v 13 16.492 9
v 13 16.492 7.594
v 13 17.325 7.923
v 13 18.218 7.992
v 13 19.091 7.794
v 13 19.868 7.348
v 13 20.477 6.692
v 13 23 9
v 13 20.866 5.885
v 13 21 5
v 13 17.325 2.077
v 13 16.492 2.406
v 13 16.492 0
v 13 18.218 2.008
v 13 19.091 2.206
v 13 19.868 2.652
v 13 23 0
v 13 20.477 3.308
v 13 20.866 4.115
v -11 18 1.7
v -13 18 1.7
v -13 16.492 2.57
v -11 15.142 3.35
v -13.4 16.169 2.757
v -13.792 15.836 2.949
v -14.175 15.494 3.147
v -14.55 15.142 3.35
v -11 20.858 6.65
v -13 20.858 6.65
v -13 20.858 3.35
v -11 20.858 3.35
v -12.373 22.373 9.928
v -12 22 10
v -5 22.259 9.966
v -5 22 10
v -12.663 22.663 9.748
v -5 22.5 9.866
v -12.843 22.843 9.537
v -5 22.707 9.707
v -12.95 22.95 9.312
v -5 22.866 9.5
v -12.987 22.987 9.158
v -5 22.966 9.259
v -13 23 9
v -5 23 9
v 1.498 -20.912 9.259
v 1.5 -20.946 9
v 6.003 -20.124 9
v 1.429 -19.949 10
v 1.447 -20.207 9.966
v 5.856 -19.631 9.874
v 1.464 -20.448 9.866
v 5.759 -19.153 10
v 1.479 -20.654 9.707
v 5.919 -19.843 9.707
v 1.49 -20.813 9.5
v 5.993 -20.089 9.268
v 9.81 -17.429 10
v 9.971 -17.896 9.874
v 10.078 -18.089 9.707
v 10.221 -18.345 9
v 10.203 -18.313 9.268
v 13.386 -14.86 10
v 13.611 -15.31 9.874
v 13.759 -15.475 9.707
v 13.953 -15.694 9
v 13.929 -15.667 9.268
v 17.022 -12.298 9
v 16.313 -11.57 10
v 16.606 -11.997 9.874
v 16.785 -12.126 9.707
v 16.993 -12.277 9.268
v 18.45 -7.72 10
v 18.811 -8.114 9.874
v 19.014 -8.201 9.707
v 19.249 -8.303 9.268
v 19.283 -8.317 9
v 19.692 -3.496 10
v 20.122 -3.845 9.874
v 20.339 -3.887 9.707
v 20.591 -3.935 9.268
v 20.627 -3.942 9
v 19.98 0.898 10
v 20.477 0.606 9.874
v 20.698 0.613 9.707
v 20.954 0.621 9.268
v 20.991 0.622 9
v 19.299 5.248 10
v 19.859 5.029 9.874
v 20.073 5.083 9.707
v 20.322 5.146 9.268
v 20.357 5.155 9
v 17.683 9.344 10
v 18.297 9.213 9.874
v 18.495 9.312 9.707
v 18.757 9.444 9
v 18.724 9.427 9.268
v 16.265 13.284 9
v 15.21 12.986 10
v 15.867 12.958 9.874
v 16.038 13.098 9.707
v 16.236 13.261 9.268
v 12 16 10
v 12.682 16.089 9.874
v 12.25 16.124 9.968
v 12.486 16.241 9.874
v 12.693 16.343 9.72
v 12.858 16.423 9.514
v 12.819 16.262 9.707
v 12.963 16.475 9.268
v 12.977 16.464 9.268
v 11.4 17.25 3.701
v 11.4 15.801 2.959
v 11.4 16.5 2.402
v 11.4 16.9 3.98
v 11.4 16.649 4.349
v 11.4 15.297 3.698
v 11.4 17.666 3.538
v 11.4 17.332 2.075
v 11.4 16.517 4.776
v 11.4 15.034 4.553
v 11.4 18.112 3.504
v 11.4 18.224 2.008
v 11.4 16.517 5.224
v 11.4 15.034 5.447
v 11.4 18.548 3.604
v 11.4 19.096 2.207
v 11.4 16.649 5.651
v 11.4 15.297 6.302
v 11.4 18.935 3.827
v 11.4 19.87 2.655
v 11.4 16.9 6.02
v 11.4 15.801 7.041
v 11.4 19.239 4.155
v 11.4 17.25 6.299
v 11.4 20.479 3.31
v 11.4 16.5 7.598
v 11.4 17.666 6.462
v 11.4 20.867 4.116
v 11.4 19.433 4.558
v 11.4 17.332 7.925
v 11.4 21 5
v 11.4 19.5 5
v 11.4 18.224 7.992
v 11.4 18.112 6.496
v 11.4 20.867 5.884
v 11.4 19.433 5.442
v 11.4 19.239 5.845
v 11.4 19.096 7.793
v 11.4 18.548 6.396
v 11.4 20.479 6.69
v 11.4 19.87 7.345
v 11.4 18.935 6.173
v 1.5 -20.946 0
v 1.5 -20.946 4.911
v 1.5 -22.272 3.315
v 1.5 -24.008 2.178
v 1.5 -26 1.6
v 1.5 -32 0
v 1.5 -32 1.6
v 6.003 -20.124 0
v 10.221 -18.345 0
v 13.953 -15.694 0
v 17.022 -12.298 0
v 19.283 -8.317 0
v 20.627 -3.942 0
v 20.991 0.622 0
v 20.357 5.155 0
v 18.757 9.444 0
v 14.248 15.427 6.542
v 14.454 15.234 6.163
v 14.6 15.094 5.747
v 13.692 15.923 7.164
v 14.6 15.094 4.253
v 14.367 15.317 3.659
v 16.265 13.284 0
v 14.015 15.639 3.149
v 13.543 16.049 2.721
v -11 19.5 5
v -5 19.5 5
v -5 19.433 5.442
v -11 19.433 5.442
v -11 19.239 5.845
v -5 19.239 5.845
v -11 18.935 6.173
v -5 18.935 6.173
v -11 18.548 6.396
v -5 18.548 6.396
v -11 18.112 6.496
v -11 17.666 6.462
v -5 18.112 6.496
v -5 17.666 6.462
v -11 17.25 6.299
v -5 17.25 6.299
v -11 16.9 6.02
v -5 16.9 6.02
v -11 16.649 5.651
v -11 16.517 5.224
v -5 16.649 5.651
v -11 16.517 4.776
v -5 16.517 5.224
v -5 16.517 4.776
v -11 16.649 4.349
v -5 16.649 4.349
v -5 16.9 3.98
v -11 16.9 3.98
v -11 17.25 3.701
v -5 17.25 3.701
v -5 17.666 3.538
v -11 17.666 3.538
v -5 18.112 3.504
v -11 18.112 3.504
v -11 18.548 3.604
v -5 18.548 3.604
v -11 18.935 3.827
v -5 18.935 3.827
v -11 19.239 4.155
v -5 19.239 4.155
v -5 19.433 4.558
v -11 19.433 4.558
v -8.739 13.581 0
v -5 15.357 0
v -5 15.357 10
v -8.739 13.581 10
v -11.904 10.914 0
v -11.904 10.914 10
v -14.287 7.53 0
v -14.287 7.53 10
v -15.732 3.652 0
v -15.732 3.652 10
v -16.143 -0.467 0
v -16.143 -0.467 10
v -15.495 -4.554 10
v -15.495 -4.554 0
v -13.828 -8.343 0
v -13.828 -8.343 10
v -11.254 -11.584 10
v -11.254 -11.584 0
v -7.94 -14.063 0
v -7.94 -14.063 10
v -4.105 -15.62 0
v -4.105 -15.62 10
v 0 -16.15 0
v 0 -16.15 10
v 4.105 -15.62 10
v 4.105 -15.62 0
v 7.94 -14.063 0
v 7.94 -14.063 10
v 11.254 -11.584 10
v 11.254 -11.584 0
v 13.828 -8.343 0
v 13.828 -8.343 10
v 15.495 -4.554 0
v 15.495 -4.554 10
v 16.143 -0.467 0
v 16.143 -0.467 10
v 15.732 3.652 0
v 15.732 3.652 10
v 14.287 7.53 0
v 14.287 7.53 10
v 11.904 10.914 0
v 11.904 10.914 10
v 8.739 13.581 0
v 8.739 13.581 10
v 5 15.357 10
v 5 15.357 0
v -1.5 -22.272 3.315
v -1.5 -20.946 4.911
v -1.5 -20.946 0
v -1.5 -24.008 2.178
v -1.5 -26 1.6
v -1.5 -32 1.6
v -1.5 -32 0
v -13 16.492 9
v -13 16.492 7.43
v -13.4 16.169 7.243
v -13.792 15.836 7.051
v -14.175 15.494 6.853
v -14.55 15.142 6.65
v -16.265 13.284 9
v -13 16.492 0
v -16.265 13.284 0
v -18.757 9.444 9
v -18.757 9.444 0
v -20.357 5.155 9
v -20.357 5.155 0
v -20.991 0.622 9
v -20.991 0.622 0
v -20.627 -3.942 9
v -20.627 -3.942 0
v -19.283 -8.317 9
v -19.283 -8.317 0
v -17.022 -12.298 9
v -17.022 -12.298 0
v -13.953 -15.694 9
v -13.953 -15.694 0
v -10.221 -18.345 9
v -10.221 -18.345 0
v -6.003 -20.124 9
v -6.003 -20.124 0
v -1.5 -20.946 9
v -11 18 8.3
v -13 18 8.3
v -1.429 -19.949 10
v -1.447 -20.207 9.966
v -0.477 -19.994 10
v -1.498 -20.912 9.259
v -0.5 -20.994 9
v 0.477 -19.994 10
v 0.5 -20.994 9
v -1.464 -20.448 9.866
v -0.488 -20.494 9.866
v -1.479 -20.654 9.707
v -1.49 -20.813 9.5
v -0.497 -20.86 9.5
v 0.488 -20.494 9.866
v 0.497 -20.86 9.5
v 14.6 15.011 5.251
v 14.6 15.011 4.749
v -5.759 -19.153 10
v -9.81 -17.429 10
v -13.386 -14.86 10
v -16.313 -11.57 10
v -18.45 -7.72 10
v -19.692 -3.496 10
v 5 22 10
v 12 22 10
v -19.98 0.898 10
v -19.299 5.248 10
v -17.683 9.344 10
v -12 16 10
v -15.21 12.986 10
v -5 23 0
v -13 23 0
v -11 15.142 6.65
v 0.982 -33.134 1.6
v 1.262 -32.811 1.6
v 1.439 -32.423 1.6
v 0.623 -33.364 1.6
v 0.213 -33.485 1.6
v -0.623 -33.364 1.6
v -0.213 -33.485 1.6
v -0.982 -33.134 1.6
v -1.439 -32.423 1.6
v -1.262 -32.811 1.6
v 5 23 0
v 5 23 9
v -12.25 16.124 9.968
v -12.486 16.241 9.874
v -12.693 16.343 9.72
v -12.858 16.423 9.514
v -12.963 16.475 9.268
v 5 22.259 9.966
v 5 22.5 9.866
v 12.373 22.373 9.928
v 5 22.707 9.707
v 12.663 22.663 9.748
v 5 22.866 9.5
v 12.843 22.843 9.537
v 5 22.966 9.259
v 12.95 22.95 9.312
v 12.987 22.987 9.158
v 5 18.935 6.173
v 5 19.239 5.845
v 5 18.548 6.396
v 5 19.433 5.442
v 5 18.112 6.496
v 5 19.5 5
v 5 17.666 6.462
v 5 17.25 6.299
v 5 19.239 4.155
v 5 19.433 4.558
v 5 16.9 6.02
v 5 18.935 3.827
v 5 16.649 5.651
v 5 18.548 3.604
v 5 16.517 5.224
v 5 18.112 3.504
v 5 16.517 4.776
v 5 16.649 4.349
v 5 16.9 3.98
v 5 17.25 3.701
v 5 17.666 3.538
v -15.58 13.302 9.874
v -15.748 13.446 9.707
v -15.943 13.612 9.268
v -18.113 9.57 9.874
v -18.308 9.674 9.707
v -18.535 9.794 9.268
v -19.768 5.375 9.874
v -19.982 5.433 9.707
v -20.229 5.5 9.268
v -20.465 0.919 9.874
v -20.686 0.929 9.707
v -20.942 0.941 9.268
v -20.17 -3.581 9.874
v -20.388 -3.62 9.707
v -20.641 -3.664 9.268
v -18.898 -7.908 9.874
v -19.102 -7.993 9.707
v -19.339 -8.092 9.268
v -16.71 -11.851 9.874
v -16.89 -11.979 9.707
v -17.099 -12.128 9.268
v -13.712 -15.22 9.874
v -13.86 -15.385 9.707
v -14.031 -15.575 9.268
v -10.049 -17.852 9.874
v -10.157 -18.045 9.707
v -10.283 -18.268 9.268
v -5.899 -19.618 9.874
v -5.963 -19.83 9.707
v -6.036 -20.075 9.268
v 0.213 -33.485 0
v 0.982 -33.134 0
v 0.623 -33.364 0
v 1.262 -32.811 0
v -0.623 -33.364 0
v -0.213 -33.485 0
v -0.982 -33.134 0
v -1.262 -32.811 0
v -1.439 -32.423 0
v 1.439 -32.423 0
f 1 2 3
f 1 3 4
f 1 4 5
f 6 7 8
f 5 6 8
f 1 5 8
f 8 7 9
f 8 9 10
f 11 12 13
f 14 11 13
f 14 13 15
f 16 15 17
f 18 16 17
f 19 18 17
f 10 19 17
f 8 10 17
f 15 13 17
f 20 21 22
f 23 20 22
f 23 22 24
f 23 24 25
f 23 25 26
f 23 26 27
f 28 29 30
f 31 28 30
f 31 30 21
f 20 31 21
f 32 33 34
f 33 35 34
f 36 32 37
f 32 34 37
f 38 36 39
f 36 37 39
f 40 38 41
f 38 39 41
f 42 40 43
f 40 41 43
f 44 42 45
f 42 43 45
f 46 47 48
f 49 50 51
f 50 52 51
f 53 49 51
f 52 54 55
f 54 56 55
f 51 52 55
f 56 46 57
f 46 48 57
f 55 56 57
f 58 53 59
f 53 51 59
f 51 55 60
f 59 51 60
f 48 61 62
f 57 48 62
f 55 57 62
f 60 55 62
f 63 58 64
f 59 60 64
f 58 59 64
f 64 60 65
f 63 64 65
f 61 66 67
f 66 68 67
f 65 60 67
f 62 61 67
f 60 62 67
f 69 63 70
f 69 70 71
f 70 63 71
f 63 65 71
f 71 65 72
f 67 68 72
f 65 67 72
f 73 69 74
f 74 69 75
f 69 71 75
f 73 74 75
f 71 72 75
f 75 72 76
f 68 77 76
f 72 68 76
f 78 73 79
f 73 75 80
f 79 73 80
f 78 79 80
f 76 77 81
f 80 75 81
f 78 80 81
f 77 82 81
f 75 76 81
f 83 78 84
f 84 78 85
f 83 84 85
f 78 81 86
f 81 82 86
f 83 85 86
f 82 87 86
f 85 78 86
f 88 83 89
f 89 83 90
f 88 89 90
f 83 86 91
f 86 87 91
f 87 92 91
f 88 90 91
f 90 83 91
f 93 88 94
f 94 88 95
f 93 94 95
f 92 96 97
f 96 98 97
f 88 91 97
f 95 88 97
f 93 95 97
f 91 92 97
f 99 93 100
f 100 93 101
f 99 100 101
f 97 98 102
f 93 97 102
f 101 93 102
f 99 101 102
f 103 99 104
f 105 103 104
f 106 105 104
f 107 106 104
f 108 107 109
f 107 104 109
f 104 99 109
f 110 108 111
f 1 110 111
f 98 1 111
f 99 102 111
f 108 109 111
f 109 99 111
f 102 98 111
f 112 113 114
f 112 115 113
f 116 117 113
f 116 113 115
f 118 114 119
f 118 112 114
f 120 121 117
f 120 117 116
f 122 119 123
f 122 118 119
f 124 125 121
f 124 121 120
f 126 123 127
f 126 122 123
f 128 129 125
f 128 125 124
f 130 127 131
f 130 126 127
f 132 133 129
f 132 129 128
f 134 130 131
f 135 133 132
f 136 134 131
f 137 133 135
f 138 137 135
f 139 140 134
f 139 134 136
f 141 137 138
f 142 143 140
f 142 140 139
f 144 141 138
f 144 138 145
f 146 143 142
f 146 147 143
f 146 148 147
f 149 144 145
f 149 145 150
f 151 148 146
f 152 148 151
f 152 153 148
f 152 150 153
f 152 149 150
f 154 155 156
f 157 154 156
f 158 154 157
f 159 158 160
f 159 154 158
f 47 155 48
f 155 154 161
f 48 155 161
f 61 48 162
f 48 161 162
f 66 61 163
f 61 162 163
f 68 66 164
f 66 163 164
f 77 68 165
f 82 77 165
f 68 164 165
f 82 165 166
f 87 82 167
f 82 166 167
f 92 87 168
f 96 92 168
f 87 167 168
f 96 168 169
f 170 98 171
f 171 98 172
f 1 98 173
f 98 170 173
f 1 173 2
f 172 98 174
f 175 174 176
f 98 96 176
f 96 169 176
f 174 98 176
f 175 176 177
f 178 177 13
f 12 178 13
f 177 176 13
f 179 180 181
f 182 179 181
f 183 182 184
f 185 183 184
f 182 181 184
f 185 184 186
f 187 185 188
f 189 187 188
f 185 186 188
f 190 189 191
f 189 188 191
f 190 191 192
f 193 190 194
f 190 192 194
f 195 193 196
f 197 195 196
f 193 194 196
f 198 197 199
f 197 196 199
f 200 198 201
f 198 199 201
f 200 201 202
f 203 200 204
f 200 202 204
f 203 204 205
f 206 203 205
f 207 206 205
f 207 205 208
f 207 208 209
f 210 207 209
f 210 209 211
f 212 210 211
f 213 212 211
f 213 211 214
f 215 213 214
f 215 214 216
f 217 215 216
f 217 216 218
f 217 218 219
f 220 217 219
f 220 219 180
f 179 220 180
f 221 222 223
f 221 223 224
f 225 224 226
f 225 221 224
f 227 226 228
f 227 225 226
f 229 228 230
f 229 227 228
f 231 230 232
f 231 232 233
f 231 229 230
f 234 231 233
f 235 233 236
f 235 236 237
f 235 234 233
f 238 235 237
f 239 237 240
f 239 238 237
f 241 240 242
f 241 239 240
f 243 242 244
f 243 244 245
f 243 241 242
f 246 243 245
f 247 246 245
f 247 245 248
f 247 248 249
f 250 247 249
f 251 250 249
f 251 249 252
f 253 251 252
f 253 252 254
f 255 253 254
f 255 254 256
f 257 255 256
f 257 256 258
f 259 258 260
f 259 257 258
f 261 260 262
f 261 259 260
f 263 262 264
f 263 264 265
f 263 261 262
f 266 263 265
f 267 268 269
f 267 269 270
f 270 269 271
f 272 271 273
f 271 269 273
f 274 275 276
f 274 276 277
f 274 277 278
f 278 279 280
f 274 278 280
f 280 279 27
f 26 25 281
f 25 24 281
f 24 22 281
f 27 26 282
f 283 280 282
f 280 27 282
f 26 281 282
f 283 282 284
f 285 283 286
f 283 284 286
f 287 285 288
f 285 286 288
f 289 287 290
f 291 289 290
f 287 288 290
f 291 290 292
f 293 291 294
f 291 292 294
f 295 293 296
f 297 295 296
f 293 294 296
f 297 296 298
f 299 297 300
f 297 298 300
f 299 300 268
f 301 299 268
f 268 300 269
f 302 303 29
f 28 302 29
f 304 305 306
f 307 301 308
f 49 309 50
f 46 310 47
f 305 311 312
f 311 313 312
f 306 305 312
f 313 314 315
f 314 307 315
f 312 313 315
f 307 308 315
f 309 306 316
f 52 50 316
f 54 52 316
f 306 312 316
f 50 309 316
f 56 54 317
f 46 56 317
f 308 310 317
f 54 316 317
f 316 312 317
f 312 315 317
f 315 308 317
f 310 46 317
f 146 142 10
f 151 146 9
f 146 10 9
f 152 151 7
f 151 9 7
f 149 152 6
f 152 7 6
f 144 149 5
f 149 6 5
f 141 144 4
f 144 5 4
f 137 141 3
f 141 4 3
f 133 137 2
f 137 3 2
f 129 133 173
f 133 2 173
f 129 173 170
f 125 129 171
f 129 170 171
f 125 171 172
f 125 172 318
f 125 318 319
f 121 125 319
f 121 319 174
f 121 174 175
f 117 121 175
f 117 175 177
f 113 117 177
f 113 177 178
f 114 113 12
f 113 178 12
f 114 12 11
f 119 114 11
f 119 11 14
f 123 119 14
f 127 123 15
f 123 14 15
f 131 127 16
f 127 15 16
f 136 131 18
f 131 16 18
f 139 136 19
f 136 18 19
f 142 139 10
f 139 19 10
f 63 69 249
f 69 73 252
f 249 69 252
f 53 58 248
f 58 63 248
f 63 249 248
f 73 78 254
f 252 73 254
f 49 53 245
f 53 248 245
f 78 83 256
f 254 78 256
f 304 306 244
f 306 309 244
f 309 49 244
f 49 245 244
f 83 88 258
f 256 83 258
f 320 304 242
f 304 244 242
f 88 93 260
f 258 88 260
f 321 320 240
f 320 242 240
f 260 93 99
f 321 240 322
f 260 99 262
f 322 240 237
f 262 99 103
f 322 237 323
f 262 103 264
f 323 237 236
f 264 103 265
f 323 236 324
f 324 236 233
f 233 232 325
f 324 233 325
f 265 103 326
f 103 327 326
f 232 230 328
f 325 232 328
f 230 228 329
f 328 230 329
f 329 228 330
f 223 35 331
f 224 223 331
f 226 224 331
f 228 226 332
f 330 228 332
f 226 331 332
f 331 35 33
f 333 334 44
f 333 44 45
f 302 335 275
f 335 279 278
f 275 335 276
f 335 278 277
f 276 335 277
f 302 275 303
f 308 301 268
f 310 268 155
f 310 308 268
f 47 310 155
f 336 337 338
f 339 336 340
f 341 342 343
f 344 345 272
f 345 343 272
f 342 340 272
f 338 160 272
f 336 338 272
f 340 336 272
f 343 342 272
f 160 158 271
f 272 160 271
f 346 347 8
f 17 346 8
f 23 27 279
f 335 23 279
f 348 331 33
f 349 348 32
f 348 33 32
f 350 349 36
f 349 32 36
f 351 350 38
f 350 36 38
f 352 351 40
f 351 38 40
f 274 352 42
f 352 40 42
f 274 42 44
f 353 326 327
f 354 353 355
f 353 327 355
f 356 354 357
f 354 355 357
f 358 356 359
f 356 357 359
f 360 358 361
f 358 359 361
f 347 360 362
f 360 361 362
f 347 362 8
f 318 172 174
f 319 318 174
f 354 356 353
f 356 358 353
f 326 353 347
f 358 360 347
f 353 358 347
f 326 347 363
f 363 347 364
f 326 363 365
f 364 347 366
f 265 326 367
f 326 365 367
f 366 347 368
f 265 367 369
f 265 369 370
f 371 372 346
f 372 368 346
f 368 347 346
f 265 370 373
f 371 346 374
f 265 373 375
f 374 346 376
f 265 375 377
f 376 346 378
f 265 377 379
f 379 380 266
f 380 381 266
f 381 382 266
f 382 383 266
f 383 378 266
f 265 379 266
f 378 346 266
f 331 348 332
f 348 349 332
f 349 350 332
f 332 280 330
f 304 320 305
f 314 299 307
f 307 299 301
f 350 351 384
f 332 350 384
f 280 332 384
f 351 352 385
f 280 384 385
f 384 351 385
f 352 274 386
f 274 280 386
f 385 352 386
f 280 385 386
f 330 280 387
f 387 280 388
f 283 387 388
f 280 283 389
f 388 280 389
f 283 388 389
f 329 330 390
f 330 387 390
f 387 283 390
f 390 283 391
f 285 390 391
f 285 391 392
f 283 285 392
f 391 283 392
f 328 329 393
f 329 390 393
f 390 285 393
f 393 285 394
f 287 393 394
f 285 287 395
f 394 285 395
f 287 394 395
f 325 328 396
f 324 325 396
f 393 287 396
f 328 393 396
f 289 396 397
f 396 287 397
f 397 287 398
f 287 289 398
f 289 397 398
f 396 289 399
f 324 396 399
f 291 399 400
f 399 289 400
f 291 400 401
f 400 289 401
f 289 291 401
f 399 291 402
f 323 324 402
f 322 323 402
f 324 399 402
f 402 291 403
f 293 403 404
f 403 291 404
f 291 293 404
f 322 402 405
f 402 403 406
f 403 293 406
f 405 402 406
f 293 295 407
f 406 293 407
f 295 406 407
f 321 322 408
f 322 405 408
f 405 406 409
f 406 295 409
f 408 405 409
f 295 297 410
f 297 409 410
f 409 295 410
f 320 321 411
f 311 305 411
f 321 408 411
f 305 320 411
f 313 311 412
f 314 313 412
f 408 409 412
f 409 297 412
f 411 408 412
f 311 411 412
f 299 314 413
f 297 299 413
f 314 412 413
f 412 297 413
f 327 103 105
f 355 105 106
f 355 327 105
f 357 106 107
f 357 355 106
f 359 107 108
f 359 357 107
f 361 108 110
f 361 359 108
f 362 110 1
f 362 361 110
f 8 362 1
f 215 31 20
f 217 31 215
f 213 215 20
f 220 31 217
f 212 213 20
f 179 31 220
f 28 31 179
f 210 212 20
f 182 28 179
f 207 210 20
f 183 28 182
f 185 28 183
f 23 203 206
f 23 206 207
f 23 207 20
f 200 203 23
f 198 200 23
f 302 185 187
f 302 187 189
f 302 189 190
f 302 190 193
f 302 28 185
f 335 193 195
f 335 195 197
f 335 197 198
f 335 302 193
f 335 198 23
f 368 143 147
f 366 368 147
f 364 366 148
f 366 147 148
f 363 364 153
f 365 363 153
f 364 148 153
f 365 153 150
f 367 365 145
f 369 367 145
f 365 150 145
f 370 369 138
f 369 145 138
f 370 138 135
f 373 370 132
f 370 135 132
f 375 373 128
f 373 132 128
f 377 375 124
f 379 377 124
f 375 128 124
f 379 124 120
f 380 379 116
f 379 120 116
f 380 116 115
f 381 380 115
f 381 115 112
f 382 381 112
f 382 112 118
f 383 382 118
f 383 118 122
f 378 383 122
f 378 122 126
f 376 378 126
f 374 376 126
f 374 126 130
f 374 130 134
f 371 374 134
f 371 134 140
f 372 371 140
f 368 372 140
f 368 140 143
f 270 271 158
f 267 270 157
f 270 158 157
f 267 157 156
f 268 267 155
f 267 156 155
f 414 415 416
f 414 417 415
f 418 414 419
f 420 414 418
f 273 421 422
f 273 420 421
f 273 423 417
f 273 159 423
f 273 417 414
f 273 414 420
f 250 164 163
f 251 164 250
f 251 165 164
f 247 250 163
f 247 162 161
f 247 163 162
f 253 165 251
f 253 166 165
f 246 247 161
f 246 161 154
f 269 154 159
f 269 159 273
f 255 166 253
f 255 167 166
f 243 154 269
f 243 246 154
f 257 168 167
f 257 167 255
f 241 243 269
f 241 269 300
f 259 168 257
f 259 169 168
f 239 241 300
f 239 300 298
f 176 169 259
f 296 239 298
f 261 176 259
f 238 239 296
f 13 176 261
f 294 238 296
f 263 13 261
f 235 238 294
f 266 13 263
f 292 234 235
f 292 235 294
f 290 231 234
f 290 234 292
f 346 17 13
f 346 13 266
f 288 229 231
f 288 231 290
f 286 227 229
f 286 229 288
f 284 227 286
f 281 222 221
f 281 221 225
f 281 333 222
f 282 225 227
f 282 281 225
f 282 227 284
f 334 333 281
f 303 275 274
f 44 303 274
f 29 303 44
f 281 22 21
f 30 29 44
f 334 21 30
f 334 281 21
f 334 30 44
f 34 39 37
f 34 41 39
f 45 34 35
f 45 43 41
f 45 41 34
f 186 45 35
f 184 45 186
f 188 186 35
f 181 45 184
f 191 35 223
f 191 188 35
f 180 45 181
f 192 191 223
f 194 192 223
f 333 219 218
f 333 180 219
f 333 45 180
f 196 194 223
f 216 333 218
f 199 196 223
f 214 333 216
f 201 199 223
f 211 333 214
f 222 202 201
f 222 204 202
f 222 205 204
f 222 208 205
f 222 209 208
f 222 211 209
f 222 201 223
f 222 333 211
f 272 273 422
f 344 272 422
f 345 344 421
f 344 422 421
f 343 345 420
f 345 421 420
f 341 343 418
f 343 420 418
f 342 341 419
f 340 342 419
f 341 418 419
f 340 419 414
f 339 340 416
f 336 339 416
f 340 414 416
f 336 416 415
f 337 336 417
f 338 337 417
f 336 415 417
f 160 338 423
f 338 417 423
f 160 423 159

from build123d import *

# Parameters (mm, degrees)
PAD_DEPTH            = 10
POCKET_DEPTH         = 8.4
SKETCH002_R          = 1.5
POCKET001_DEPTH      = 34.001
POCKET001_DEPTH_BACK = -8.001
SKETCH003_R          = 3
POCKET004_DEPTH      = 1.6
POCKET005_DEPTH      = 2
FILLET_R             = 1
PAD001_DEPTH         = 1.5


with BuildPart() as fillet_body:
    # Sketch → Pad (new body)
    with BuildSketch(Plane.XY):
        with BuildLine():
            ThreePointArc((-5, 15.356513), (0, -16.15), (5, 15.356513))
            Line((5, 23), (5, 15.356513))
            Line((5, 23), (13, 23))
            Line((13, 16.492423), (13, 23))
            ThreePointArc((1.5, -20.94636), (20.074315, -6.166189), (13, 16.492423))
            Line((1.5, -20.94636), (1.5, -32.000014))
            ThreePointArc((-1.5, -32.000014), (0, -33.5), (1.5, -32.000014))
            Line((-1.5, -20.94636), (-1.5, -32.000014))
            ThreePointArc((-13, 16.492423), (-20.074315, -6.166189), (-1.5, -20.94636))
            Line((-13, 16.492423), (-13, 23))
            Line((-13, 23), (-5, 23))
            Line((-5, 23), (-5, 15.356513))
        make_face()
    extrude(amount=PAD_DEPTH)

    # Sketch001 → Pocket (cut)
    with BuildSketch(Plane.XY.offset(10)):
        with BuildLine():
            ThreePointArc((-1.5, -20.94636), (0, -21), (1.5, -20.94636))
            Line((1.5, -20.94636), (1.5, -32.000014))
            ThreePointArc((-1.5, -32.000014), (0, -33.5), (1.5, -32.000014))
            Line((-1.5, -20.94636), (-1.5, -32.000014))
        make_face()
    extrude(amount=-POCKET_DEPTH, mode=Mode.SUBTRACT)

    # Sketch002 → Pocket001 (cut, two sides)
    with BuildSketch(Plane.YZ.offset(13)) as pocket001_sk:
        with Locations((18, 5)):
            Circle(SKETCH002_R)
    extrude(amount=-POCKET001_DEPTH, mode=Mode.SUBTRACT)
    extrude(pocket001_sk.sketch, amount=-POCKET001_DEPTH_BACK, mode=Mode.SUBTRACT)

    # Sketch003 → Pocket004 (cut, symmetric)
    with BuildSketch(Plane.YZ.offset(13)):
        with Locations((18, 5)):
            Circle(SKETCH003_R)
    extrude(amount=POCKET004_DEPTH, both=True, mode=Mode.SUBTRACT)

    # Sketch004 → Pocket005 (cut, symmetric)
    with BuildSketch(Plane(origin=(-13, 0, 0), x_dir=(0, -1, 0), z_dir=(-1, 0, 0))):
        Polygon((-18, 8.3), (-20.857884, 6.65), (-20.857884, 3.35), (-18, 1.7), (-15.142116, 3.35), (-15.142116, 6.65), align=None)
    extrude(amount=POCKET005_DEPTH, both=True, mode=Mode.SUBTRACT)

    # Fillet
    fillet_edges = [fillet_body.edges().sort_by_distance(p)[0] for p in [
        (-20.074315, -6.166189, 10),
        (0, -21, 10),
        (20.074315, -6.166189, 10),
        (13, 19.746211, 10),
        (9, 23, 10),
        (-9, 23, 10),
        (-13, 19.746211, 10),
    ]]
    fillet(fillet_edges, radius=FILLET_R)


with BuildPart() as fusion:
    # Sketch005 → Pad001 (new body, symmetric)
    with BuildSketch(Plane.YZ):
        with BuildLine():
            Line((-26, 1.6), (-20, 1.6))
            Line((-20, 1.6), (-20, 9.5))
            ThreePointArc((-26, 1.6), (-21.359014, 4.303682), (-20, 9.5))
        make_face()
    extrude(amount=PAD001_DEPTH, both=True)

    # Fusion: union Fillet body
    add(fillet_body.part)


solid = fusion.part
